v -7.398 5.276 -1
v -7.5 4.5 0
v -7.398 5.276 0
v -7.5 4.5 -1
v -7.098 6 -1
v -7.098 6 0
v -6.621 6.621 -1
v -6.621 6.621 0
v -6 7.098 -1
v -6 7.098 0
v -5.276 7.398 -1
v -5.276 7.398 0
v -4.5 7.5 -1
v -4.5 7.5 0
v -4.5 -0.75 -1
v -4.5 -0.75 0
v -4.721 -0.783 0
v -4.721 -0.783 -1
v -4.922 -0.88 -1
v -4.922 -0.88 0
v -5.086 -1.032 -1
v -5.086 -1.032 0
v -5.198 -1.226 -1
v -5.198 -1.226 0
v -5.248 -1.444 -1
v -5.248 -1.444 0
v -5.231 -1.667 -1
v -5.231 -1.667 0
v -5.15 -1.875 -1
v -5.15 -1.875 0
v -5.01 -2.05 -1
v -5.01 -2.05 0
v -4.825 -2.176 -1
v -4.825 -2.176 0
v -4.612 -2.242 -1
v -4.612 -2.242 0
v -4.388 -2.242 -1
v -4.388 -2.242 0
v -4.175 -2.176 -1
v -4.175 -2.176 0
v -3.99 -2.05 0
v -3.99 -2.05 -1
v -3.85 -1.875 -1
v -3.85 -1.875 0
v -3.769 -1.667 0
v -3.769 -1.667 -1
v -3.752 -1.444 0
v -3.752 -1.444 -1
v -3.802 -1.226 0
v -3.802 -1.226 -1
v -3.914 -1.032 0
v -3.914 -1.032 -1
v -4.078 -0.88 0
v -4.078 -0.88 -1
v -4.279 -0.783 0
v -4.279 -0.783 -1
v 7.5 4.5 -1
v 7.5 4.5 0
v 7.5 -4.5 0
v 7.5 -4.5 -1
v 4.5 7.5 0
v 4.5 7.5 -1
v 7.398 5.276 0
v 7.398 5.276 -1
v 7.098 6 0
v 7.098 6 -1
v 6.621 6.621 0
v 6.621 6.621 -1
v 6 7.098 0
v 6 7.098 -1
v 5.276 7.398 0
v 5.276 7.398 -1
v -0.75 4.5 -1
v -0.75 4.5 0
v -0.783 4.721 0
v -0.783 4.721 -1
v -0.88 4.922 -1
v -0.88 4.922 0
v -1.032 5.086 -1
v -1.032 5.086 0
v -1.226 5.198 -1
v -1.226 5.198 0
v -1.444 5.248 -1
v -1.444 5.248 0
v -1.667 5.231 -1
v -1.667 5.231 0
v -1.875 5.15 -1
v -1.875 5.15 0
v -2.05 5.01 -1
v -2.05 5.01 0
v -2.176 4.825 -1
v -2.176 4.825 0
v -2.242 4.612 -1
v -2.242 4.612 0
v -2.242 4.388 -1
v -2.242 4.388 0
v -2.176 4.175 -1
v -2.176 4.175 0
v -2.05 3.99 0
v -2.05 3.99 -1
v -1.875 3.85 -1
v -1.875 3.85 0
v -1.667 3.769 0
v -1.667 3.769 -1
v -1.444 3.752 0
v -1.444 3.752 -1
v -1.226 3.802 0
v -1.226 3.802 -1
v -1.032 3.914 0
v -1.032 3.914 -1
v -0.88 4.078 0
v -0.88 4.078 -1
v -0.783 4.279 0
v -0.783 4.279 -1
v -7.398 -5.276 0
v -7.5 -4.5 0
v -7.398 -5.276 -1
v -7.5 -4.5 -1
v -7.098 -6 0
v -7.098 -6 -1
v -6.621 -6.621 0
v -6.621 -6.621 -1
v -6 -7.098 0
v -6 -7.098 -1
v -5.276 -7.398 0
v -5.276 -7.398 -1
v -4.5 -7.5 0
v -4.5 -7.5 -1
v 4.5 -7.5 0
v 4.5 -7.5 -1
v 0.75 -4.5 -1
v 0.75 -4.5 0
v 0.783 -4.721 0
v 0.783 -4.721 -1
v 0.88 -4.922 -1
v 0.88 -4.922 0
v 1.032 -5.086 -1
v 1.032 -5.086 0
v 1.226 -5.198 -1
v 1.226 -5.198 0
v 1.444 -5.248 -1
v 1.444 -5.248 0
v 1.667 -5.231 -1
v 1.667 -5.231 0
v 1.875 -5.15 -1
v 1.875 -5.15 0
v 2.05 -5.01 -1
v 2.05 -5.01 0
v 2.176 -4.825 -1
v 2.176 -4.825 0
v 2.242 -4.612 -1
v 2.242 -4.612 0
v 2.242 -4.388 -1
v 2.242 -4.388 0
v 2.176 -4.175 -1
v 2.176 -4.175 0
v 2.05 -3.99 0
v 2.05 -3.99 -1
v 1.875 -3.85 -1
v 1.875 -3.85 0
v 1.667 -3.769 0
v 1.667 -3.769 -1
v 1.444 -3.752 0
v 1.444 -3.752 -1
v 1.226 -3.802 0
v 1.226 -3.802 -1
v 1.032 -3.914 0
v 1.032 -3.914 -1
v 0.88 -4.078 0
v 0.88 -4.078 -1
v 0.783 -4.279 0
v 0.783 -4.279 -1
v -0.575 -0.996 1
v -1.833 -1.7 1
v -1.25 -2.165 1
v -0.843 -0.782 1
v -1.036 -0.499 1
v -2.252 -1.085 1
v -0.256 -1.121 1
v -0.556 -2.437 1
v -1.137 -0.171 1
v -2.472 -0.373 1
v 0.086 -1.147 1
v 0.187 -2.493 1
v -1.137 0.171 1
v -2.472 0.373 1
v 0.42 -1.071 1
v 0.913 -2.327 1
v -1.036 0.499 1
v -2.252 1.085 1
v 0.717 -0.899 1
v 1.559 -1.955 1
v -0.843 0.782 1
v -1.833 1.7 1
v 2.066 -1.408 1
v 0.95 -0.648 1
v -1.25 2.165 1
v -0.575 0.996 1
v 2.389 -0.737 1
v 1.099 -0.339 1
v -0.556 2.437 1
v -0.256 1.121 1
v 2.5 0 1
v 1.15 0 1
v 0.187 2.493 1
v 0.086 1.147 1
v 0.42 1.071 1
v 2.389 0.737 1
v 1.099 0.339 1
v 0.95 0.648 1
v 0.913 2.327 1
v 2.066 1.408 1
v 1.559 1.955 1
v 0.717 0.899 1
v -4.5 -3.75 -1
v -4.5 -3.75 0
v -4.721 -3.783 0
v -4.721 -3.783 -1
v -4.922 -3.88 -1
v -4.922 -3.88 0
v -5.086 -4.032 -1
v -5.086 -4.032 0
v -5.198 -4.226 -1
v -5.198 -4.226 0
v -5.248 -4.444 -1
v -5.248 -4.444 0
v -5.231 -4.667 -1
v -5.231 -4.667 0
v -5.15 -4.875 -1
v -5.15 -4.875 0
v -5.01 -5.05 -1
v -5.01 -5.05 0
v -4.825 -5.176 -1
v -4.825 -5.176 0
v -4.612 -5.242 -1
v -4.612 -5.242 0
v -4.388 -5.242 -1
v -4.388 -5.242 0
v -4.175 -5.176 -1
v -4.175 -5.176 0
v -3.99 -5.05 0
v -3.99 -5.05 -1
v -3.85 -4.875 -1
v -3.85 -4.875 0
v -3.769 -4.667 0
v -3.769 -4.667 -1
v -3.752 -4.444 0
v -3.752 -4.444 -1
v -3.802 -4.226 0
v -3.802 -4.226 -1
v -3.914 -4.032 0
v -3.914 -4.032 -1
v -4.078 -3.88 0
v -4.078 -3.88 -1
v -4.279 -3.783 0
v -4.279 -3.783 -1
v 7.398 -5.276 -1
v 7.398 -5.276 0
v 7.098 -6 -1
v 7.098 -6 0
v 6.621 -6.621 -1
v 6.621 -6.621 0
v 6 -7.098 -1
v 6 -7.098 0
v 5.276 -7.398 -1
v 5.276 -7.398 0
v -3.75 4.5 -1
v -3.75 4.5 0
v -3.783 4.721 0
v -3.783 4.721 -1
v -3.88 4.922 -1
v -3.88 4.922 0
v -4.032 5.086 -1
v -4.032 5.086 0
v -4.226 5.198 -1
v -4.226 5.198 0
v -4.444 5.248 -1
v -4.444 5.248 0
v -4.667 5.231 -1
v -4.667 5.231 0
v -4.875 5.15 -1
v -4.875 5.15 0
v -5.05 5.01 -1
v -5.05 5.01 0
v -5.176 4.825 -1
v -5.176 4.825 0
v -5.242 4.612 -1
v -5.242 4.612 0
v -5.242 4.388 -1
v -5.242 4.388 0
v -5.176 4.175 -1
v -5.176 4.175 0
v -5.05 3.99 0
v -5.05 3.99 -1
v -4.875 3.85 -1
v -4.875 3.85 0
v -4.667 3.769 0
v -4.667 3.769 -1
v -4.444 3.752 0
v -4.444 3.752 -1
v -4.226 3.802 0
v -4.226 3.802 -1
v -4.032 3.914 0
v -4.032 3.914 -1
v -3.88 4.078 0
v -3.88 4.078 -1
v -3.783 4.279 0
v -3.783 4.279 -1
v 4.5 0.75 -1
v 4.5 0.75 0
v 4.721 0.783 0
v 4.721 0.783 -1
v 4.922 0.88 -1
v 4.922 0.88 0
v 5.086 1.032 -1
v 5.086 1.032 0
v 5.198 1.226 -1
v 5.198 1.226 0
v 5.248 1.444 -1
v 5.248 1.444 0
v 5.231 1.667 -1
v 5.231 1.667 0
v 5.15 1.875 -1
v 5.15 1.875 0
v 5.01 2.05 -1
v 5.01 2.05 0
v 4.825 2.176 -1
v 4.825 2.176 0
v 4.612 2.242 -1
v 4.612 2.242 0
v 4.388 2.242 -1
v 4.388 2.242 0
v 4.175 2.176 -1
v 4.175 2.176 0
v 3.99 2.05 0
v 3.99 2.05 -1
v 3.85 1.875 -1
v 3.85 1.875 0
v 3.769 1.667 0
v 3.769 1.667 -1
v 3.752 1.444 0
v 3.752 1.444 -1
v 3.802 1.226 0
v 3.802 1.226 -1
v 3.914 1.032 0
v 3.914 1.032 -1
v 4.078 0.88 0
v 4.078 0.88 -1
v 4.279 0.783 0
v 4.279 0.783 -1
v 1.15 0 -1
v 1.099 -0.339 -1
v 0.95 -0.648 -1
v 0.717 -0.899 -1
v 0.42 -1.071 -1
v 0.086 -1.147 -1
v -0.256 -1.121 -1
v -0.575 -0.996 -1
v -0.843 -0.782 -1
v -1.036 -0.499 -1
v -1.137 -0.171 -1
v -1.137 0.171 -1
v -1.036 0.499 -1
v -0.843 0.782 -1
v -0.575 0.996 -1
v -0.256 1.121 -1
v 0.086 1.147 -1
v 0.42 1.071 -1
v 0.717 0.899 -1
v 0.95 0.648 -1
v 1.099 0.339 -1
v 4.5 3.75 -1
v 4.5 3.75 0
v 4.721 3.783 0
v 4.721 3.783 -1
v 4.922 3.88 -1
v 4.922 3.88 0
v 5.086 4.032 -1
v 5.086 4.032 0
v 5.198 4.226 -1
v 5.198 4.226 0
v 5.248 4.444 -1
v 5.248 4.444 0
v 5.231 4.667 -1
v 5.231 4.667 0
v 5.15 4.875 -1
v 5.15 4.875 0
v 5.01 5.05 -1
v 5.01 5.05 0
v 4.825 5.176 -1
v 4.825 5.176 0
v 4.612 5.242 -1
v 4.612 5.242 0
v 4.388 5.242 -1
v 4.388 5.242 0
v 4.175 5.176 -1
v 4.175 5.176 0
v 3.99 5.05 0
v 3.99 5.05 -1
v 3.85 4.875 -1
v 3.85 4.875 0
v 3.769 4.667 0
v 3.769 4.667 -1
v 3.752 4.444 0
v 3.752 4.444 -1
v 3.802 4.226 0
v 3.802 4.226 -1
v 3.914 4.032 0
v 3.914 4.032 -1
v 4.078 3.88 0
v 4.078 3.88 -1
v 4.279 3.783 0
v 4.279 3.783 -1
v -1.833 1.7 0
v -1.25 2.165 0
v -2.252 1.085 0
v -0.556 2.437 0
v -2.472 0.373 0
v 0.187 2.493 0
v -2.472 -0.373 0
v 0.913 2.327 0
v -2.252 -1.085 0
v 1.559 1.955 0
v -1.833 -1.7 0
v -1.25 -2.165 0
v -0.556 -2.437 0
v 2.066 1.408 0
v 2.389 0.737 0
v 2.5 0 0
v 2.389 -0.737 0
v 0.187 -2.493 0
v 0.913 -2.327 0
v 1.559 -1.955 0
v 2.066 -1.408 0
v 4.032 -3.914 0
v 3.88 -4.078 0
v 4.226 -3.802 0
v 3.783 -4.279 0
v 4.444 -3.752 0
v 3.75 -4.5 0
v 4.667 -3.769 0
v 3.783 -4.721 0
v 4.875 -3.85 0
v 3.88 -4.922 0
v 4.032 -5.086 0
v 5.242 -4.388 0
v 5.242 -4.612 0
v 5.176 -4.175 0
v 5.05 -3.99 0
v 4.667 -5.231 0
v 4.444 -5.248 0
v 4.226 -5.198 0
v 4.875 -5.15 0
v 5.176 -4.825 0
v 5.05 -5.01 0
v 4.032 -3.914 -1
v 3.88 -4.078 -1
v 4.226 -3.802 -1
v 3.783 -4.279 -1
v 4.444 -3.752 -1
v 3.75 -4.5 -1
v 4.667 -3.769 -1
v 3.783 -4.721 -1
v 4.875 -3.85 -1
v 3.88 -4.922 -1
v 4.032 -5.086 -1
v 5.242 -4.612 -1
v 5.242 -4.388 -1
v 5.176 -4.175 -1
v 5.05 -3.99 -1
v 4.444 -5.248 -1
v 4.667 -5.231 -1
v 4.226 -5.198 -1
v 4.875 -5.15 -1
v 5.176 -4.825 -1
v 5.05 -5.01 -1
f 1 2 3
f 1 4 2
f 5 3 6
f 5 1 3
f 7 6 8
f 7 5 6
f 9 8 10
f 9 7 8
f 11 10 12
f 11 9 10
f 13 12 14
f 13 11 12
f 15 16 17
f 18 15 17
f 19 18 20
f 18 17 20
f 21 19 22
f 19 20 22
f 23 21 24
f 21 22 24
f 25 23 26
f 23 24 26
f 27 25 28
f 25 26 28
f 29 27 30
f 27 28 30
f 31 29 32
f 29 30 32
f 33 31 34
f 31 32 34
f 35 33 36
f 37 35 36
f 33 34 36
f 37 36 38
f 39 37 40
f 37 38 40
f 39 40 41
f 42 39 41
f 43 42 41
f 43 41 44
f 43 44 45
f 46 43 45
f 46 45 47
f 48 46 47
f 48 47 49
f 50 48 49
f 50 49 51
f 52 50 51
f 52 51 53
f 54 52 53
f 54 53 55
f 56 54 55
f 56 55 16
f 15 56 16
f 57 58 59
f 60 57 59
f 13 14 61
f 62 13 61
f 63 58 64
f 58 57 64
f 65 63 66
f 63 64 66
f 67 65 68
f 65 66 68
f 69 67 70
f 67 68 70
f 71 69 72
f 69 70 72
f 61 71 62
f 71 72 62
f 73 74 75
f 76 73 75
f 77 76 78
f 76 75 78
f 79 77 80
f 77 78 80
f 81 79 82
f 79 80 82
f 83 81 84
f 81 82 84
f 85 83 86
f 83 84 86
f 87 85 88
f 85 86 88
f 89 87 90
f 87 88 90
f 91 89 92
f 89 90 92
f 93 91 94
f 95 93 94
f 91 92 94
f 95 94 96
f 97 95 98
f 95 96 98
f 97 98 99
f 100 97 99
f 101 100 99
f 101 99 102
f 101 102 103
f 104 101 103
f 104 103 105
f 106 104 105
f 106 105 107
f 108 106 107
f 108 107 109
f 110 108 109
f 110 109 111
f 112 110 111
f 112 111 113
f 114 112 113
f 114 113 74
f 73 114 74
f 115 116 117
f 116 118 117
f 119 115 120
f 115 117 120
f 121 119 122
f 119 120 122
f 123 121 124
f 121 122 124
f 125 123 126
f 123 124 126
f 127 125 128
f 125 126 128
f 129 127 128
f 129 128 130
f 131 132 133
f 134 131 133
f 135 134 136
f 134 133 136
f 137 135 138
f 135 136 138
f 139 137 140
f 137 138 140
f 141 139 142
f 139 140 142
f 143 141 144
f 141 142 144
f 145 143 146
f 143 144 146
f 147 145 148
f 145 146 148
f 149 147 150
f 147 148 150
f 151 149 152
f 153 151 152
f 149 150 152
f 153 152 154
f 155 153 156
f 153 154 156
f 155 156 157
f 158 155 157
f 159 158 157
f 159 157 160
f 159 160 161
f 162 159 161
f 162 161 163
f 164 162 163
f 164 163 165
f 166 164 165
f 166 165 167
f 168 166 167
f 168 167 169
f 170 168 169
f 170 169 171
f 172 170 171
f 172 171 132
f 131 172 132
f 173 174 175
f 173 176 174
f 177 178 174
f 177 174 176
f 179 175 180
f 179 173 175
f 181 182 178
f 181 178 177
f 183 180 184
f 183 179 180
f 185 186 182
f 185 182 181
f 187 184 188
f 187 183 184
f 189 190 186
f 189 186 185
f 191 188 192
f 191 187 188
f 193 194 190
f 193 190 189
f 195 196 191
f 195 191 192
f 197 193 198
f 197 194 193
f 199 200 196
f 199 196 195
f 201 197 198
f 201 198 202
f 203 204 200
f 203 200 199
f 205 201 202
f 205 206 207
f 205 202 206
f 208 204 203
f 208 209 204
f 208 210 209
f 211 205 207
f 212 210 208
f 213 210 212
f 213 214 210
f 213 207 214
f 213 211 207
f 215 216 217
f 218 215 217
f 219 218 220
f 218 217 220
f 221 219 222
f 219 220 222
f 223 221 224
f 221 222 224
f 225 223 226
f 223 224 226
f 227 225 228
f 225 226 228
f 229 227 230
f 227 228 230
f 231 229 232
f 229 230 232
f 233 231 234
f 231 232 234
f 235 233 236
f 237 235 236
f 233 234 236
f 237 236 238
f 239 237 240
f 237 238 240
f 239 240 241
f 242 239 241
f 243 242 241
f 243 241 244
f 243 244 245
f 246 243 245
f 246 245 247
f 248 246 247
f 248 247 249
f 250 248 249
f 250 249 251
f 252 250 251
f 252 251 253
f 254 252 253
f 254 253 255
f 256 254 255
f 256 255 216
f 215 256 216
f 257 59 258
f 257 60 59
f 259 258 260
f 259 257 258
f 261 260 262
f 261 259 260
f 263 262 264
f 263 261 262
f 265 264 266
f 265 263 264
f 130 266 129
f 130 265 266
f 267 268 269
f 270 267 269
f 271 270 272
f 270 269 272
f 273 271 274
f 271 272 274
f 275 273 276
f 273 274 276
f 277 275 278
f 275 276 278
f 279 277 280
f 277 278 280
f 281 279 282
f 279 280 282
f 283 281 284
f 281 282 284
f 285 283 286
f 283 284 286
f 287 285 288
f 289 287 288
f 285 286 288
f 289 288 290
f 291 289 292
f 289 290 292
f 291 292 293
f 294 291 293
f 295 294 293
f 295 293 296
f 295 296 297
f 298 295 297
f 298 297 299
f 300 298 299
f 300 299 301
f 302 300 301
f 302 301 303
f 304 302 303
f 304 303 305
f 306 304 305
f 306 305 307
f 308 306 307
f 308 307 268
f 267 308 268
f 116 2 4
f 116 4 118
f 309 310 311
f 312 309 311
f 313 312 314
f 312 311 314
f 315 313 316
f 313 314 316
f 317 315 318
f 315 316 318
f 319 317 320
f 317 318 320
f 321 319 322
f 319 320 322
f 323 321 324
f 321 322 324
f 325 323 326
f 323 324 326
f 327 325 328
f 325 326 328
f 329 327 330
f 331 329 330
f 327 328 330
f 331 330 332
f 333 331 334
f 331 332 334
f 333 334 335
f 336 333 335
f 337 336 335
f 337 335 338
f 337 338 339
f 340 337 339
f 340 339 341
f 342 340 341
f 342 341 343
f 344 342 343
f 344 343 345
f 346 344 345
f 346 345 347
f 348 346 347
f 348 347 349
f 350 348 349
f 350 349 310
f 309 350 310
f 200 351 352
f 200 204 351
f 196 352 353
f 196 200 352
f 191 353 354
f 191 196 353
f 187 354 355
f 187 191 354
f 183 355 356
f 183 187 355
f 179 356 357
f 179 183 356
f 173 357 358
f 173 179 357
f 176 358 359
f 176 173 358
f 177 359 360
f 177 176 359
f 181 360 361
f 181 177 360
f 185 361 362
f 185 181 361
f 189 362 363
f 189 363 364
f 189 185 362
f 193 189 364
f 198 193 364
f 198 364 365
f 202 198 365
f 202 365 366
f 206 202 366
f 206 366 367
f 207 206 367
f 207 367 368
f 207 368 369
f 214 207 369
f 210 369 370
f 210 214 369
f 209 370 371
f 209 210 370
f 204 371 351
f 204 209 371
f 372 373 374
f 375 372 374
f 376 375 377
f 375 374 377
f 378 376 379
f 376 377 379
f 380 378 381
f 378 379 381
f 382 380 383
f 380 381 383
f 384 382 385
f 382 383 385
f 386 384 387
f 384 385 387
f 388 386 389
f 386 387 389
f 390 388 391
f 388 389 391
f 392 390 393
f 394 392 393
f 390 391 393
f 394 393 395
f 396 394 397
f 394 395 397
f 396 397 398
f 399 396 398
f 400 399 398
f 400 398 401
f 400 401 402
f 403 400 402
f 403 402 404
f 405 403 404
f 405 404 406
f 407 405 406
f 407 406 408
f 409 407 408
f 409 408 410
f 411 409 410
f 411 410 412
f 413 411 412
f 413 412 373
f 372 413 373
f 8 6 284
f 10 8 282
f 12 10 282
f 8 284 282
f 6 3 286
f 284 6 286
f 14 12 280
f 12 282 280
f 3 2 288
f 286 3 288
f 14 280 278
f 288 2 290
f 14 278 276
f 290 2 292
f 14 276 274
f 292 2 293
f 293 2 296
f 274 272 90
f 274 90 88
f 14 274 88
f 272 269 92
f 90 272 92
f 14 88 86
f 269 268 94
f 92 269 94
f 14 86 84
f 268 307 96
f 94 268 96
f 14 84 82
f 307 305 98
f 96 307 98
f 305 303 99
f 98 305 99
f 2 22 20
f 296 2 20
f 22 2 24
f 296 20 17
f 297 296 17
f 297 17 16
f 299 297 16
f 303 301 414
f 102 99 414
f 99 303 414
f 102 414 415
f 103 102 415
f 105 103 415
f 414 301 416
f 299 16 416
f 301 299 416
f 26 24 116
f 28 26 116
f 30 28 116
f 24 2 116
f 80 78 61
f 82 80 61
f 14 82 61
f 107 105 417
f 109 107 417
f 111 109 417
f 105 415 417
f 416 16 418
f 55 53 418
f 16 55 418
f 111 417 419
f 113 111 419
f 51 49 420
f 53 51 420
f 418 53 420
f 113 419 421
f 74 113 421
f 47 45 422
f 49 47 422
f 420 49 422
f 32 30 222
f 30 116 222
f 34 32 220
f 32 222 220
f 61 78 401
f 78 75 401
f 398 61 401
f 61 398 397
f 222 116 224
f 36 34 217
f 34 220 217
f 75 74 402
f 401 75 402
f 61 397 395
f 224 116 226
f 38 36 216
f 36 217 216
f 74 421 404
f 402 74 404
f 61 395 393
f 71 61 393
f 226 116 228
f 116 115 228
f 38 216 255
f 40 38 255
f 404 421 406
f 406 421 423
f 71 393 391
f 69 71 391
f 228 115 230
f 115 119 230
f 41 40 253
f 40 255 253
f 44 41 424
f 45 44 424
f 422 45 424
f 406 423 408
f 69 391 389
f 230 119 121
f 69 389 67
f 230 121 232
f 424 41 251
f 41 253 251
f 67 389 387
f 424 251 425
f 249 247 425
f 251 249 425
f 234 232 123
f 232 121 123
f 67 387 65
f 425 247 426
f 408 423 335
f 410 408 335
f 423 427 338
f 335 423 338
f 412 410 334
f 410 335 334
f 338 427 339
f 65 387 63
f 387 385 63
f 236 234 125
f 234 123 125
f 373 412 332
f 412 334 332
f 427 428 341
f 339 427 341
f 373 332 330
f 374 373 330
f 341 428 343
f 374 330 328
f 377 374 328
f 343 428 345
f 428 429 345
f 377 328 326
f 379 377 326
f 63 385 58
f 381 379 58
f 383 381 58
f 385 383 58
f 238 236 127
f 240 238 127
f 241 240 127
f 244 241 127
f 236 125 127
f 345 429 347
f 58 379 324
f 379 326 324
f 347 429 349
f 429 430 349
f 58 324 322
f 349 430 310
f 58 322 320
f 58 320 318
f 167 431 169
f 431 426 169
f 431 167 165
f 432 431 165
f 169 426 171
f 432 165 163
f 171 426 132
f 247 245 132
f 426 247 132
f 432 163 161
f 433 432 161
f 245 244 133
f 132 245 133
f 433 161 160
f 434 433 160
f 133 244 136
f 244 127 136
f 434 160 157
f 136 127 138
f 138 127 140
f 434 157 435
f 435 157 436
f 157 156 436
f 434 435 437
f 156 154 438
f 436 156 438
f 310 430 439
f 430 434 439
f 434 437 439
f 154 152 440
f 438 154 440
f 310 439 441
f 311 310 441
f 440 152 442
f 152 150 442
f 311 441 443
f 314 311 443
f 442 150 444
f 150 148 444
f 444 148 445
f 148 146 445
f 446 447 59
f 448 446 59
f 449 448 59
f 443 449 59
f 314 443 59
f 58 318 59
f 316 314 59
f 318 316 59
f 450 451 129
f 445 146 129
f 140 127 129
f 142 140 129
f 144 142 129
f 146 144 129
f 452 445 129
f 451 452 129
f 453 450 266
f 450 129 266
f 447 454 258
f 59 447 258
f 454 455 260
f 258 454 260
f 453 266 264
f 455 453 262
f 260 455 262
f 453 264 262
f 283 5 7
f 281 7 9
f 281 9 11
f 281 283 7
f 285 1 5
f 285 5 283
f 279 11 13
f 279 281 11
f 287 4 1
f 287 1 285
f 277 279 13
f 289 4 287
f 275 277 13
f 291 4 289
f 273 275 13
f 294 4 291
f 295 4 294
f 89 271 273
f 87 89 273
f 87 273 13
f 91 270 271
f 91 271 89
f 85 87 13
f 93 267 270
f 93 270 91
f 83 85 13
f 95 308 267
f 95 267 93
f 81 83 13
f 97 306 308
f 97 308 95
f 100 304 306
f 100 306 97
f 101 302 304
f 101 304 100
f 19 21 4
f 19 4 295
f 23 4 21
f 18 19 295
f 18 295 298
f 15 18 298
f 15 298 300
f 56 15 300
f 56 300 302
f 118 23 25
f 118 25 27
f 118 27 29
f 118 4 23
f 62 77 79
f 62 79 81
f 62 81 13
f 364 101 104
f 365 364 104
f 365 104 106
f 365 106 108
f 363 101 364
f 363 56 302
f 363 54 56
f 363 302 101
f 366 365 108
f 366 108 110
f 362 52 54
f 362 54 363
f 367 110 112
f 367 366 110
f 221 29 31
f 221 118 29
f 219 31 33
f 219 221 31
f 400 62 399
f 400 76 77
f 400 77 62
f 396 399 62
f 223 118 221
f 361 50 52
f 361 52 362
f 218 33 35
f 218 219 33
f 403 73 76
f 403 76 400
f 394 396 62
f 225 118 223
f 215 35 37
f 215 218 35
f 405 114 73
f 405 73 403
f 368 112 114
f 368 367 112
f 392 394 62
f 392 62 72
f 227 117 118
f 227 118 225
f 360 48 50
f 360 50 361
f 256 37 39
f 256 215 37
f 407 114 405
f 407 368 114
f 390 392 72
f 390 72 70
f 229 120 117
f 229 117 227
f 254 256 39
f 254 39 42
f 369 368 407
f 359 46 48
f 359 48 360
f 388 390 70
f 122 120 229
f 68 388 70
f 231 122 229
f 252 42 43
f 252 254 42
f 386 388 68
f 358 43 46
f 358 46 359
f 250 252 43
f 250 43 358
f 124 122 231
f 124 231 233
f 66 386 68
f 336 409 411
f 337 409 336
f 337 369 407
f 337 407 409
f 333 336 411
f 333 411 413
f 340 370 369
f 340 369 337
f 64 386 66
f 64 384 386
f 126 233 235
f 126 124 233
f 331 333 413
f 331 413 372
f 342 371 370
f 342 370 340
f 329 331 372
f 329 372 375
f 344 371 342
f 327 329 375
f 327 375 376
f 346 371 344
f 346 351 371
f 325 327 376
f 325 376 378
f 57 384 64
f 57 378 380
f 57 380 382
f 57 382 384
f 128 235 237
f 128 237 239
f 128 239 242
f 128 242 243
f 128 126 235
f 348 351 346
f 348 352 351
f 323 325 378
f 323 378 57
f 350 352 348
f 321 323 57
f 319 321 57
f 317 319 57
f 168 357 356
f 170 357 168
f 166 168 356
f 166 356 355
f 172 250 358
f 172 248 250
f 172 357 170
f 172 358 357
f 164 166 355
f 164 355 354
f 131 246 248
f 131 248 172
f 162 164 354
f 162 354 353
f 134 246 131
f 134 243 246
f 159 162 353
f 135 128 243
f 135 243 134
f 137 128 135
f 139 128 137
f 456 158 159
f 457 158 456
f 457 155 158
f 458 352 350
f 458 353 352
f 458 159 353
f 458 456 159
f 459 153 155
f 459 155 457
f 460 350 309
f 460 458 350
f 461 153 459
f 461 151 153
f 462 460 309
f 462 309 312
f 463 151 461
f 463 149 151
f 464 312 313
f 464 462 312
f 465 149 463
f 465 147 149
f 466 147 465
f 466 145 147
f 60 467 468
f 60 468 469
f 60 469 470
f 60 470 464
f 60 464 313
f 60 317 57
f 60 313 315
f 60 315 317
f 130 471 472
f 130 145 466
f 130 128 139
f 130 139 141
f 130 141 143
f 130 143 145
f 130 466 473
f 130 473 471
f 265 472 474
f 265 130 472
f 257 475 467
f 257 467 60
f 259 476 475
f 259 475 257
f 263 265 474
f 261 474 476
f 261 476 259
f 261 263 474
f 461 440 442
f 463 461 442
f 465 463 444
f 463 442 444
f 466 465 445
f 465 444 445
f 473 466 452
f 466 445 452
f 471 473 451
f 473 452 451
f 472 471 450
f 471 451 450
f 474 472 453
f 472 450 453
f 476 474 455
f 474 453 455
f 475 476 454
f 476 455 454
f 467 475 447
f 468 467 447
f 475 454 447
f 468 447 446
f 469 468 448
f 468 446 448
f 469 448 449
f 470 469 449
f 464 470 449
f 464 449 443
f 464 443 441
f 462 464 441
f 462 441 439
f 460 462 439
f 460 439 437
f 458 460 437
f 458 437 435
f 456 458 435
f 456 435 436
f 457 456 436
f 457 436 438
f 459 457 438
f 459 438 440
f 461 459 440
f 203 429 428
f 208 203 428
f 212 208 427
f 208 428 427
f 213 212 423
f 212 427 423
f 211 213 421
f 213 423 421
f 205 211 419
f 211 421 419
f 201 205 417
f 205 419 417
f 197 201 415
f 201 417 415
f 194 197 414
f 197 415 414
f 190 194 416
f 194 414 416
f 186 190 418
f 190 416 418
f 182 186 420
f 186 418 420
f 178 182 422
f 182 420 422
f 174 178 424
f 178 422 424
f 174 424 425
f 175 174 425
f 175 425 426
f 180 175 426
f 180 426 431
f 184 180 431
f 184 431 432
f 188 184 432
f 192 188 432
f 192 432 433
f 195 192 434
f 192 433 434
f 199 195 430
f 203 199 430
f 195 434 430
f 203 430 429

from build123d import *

# Parameters (mm, degrees)
F0_R            = 2.5
F0_R_2          = 1.15
F1_DEPTH        = 1
F2_W            = 15
F2_H            = 15
F2_R            = 5
F2_R_2          = 2.5
F2_R_3          = 1.15
F3_DEPTH        = 1
F4_R            = 3
F5_R            = 0.75
F6_DEPTH        = 25
F6_COPIES_COUNT = 4


# Not quite as in the source:
# - a pattern or mirror of a feature is missing from the dataset's text; its kind, count and spacing are read off the source's solid


with BuildPart() as f1:
    # F0 (on Top) → F1 (new body)
    with BuildSketch(Plane.XY):
        Circle(F0_R)
        Circle(F0_R_2, mode=Mode.SUBTRACT)
    extrude(amount=F1_DEPTH)

    # F2 (on face) → F3 (join)
    with BuildSketch(Plane(origin=(0, 0, 0), x_dir=(1, 0, 0), z_dir=(0, 0, -1))):
        Rectangle(F2_W, F2_H)
        Circle(F2_R, mode=Mode.SUBTRACT)
        Circle(F2_R)
        Circle(F2_R_2, mode=Mode.SUBTRACT)
        Circle(F2_R_2)
        Circle(F2_R_3, mode=Mode.SUBTRACT)
    extrude(amount=F3_DEPTH)

    # F4
    f4_edges = [f1.edges().sort_by_distance(p)[0] for p in [
        (-7.5, 7.5, -0.5),
        (7.5, 7.5, -0.5),
        (-7.5, -7.5, -0.5),
        (7.5, -7.5, -0.5),
    ]]
    fillet(f4_edges, radius=F4_R)

    # F5 (on face) → F6 (cut)
    with BuildSketch(Plane.XY):
        with Locations((-4.5, 4.5)):
            Circle(F5_R)
        with Locations((-1.5, 4.5)):
            Circle(F5_R)
    f6 = extrude(amount=-F6_DEPTH, mode=Mode.SUBTRACT)

    # F6_copies: F6 ×4 about axis
    f6_copies_axis = Axis((0, 0, 0), (0, 0, 1))
    for i in range(1, F6_COPIES_COUNT):
        add(f6.rotate(f6_copies_axis, i * 360 / F6_COPIES_COUNT), mode=Mode.SUBTRACT)


solid = f1.part
